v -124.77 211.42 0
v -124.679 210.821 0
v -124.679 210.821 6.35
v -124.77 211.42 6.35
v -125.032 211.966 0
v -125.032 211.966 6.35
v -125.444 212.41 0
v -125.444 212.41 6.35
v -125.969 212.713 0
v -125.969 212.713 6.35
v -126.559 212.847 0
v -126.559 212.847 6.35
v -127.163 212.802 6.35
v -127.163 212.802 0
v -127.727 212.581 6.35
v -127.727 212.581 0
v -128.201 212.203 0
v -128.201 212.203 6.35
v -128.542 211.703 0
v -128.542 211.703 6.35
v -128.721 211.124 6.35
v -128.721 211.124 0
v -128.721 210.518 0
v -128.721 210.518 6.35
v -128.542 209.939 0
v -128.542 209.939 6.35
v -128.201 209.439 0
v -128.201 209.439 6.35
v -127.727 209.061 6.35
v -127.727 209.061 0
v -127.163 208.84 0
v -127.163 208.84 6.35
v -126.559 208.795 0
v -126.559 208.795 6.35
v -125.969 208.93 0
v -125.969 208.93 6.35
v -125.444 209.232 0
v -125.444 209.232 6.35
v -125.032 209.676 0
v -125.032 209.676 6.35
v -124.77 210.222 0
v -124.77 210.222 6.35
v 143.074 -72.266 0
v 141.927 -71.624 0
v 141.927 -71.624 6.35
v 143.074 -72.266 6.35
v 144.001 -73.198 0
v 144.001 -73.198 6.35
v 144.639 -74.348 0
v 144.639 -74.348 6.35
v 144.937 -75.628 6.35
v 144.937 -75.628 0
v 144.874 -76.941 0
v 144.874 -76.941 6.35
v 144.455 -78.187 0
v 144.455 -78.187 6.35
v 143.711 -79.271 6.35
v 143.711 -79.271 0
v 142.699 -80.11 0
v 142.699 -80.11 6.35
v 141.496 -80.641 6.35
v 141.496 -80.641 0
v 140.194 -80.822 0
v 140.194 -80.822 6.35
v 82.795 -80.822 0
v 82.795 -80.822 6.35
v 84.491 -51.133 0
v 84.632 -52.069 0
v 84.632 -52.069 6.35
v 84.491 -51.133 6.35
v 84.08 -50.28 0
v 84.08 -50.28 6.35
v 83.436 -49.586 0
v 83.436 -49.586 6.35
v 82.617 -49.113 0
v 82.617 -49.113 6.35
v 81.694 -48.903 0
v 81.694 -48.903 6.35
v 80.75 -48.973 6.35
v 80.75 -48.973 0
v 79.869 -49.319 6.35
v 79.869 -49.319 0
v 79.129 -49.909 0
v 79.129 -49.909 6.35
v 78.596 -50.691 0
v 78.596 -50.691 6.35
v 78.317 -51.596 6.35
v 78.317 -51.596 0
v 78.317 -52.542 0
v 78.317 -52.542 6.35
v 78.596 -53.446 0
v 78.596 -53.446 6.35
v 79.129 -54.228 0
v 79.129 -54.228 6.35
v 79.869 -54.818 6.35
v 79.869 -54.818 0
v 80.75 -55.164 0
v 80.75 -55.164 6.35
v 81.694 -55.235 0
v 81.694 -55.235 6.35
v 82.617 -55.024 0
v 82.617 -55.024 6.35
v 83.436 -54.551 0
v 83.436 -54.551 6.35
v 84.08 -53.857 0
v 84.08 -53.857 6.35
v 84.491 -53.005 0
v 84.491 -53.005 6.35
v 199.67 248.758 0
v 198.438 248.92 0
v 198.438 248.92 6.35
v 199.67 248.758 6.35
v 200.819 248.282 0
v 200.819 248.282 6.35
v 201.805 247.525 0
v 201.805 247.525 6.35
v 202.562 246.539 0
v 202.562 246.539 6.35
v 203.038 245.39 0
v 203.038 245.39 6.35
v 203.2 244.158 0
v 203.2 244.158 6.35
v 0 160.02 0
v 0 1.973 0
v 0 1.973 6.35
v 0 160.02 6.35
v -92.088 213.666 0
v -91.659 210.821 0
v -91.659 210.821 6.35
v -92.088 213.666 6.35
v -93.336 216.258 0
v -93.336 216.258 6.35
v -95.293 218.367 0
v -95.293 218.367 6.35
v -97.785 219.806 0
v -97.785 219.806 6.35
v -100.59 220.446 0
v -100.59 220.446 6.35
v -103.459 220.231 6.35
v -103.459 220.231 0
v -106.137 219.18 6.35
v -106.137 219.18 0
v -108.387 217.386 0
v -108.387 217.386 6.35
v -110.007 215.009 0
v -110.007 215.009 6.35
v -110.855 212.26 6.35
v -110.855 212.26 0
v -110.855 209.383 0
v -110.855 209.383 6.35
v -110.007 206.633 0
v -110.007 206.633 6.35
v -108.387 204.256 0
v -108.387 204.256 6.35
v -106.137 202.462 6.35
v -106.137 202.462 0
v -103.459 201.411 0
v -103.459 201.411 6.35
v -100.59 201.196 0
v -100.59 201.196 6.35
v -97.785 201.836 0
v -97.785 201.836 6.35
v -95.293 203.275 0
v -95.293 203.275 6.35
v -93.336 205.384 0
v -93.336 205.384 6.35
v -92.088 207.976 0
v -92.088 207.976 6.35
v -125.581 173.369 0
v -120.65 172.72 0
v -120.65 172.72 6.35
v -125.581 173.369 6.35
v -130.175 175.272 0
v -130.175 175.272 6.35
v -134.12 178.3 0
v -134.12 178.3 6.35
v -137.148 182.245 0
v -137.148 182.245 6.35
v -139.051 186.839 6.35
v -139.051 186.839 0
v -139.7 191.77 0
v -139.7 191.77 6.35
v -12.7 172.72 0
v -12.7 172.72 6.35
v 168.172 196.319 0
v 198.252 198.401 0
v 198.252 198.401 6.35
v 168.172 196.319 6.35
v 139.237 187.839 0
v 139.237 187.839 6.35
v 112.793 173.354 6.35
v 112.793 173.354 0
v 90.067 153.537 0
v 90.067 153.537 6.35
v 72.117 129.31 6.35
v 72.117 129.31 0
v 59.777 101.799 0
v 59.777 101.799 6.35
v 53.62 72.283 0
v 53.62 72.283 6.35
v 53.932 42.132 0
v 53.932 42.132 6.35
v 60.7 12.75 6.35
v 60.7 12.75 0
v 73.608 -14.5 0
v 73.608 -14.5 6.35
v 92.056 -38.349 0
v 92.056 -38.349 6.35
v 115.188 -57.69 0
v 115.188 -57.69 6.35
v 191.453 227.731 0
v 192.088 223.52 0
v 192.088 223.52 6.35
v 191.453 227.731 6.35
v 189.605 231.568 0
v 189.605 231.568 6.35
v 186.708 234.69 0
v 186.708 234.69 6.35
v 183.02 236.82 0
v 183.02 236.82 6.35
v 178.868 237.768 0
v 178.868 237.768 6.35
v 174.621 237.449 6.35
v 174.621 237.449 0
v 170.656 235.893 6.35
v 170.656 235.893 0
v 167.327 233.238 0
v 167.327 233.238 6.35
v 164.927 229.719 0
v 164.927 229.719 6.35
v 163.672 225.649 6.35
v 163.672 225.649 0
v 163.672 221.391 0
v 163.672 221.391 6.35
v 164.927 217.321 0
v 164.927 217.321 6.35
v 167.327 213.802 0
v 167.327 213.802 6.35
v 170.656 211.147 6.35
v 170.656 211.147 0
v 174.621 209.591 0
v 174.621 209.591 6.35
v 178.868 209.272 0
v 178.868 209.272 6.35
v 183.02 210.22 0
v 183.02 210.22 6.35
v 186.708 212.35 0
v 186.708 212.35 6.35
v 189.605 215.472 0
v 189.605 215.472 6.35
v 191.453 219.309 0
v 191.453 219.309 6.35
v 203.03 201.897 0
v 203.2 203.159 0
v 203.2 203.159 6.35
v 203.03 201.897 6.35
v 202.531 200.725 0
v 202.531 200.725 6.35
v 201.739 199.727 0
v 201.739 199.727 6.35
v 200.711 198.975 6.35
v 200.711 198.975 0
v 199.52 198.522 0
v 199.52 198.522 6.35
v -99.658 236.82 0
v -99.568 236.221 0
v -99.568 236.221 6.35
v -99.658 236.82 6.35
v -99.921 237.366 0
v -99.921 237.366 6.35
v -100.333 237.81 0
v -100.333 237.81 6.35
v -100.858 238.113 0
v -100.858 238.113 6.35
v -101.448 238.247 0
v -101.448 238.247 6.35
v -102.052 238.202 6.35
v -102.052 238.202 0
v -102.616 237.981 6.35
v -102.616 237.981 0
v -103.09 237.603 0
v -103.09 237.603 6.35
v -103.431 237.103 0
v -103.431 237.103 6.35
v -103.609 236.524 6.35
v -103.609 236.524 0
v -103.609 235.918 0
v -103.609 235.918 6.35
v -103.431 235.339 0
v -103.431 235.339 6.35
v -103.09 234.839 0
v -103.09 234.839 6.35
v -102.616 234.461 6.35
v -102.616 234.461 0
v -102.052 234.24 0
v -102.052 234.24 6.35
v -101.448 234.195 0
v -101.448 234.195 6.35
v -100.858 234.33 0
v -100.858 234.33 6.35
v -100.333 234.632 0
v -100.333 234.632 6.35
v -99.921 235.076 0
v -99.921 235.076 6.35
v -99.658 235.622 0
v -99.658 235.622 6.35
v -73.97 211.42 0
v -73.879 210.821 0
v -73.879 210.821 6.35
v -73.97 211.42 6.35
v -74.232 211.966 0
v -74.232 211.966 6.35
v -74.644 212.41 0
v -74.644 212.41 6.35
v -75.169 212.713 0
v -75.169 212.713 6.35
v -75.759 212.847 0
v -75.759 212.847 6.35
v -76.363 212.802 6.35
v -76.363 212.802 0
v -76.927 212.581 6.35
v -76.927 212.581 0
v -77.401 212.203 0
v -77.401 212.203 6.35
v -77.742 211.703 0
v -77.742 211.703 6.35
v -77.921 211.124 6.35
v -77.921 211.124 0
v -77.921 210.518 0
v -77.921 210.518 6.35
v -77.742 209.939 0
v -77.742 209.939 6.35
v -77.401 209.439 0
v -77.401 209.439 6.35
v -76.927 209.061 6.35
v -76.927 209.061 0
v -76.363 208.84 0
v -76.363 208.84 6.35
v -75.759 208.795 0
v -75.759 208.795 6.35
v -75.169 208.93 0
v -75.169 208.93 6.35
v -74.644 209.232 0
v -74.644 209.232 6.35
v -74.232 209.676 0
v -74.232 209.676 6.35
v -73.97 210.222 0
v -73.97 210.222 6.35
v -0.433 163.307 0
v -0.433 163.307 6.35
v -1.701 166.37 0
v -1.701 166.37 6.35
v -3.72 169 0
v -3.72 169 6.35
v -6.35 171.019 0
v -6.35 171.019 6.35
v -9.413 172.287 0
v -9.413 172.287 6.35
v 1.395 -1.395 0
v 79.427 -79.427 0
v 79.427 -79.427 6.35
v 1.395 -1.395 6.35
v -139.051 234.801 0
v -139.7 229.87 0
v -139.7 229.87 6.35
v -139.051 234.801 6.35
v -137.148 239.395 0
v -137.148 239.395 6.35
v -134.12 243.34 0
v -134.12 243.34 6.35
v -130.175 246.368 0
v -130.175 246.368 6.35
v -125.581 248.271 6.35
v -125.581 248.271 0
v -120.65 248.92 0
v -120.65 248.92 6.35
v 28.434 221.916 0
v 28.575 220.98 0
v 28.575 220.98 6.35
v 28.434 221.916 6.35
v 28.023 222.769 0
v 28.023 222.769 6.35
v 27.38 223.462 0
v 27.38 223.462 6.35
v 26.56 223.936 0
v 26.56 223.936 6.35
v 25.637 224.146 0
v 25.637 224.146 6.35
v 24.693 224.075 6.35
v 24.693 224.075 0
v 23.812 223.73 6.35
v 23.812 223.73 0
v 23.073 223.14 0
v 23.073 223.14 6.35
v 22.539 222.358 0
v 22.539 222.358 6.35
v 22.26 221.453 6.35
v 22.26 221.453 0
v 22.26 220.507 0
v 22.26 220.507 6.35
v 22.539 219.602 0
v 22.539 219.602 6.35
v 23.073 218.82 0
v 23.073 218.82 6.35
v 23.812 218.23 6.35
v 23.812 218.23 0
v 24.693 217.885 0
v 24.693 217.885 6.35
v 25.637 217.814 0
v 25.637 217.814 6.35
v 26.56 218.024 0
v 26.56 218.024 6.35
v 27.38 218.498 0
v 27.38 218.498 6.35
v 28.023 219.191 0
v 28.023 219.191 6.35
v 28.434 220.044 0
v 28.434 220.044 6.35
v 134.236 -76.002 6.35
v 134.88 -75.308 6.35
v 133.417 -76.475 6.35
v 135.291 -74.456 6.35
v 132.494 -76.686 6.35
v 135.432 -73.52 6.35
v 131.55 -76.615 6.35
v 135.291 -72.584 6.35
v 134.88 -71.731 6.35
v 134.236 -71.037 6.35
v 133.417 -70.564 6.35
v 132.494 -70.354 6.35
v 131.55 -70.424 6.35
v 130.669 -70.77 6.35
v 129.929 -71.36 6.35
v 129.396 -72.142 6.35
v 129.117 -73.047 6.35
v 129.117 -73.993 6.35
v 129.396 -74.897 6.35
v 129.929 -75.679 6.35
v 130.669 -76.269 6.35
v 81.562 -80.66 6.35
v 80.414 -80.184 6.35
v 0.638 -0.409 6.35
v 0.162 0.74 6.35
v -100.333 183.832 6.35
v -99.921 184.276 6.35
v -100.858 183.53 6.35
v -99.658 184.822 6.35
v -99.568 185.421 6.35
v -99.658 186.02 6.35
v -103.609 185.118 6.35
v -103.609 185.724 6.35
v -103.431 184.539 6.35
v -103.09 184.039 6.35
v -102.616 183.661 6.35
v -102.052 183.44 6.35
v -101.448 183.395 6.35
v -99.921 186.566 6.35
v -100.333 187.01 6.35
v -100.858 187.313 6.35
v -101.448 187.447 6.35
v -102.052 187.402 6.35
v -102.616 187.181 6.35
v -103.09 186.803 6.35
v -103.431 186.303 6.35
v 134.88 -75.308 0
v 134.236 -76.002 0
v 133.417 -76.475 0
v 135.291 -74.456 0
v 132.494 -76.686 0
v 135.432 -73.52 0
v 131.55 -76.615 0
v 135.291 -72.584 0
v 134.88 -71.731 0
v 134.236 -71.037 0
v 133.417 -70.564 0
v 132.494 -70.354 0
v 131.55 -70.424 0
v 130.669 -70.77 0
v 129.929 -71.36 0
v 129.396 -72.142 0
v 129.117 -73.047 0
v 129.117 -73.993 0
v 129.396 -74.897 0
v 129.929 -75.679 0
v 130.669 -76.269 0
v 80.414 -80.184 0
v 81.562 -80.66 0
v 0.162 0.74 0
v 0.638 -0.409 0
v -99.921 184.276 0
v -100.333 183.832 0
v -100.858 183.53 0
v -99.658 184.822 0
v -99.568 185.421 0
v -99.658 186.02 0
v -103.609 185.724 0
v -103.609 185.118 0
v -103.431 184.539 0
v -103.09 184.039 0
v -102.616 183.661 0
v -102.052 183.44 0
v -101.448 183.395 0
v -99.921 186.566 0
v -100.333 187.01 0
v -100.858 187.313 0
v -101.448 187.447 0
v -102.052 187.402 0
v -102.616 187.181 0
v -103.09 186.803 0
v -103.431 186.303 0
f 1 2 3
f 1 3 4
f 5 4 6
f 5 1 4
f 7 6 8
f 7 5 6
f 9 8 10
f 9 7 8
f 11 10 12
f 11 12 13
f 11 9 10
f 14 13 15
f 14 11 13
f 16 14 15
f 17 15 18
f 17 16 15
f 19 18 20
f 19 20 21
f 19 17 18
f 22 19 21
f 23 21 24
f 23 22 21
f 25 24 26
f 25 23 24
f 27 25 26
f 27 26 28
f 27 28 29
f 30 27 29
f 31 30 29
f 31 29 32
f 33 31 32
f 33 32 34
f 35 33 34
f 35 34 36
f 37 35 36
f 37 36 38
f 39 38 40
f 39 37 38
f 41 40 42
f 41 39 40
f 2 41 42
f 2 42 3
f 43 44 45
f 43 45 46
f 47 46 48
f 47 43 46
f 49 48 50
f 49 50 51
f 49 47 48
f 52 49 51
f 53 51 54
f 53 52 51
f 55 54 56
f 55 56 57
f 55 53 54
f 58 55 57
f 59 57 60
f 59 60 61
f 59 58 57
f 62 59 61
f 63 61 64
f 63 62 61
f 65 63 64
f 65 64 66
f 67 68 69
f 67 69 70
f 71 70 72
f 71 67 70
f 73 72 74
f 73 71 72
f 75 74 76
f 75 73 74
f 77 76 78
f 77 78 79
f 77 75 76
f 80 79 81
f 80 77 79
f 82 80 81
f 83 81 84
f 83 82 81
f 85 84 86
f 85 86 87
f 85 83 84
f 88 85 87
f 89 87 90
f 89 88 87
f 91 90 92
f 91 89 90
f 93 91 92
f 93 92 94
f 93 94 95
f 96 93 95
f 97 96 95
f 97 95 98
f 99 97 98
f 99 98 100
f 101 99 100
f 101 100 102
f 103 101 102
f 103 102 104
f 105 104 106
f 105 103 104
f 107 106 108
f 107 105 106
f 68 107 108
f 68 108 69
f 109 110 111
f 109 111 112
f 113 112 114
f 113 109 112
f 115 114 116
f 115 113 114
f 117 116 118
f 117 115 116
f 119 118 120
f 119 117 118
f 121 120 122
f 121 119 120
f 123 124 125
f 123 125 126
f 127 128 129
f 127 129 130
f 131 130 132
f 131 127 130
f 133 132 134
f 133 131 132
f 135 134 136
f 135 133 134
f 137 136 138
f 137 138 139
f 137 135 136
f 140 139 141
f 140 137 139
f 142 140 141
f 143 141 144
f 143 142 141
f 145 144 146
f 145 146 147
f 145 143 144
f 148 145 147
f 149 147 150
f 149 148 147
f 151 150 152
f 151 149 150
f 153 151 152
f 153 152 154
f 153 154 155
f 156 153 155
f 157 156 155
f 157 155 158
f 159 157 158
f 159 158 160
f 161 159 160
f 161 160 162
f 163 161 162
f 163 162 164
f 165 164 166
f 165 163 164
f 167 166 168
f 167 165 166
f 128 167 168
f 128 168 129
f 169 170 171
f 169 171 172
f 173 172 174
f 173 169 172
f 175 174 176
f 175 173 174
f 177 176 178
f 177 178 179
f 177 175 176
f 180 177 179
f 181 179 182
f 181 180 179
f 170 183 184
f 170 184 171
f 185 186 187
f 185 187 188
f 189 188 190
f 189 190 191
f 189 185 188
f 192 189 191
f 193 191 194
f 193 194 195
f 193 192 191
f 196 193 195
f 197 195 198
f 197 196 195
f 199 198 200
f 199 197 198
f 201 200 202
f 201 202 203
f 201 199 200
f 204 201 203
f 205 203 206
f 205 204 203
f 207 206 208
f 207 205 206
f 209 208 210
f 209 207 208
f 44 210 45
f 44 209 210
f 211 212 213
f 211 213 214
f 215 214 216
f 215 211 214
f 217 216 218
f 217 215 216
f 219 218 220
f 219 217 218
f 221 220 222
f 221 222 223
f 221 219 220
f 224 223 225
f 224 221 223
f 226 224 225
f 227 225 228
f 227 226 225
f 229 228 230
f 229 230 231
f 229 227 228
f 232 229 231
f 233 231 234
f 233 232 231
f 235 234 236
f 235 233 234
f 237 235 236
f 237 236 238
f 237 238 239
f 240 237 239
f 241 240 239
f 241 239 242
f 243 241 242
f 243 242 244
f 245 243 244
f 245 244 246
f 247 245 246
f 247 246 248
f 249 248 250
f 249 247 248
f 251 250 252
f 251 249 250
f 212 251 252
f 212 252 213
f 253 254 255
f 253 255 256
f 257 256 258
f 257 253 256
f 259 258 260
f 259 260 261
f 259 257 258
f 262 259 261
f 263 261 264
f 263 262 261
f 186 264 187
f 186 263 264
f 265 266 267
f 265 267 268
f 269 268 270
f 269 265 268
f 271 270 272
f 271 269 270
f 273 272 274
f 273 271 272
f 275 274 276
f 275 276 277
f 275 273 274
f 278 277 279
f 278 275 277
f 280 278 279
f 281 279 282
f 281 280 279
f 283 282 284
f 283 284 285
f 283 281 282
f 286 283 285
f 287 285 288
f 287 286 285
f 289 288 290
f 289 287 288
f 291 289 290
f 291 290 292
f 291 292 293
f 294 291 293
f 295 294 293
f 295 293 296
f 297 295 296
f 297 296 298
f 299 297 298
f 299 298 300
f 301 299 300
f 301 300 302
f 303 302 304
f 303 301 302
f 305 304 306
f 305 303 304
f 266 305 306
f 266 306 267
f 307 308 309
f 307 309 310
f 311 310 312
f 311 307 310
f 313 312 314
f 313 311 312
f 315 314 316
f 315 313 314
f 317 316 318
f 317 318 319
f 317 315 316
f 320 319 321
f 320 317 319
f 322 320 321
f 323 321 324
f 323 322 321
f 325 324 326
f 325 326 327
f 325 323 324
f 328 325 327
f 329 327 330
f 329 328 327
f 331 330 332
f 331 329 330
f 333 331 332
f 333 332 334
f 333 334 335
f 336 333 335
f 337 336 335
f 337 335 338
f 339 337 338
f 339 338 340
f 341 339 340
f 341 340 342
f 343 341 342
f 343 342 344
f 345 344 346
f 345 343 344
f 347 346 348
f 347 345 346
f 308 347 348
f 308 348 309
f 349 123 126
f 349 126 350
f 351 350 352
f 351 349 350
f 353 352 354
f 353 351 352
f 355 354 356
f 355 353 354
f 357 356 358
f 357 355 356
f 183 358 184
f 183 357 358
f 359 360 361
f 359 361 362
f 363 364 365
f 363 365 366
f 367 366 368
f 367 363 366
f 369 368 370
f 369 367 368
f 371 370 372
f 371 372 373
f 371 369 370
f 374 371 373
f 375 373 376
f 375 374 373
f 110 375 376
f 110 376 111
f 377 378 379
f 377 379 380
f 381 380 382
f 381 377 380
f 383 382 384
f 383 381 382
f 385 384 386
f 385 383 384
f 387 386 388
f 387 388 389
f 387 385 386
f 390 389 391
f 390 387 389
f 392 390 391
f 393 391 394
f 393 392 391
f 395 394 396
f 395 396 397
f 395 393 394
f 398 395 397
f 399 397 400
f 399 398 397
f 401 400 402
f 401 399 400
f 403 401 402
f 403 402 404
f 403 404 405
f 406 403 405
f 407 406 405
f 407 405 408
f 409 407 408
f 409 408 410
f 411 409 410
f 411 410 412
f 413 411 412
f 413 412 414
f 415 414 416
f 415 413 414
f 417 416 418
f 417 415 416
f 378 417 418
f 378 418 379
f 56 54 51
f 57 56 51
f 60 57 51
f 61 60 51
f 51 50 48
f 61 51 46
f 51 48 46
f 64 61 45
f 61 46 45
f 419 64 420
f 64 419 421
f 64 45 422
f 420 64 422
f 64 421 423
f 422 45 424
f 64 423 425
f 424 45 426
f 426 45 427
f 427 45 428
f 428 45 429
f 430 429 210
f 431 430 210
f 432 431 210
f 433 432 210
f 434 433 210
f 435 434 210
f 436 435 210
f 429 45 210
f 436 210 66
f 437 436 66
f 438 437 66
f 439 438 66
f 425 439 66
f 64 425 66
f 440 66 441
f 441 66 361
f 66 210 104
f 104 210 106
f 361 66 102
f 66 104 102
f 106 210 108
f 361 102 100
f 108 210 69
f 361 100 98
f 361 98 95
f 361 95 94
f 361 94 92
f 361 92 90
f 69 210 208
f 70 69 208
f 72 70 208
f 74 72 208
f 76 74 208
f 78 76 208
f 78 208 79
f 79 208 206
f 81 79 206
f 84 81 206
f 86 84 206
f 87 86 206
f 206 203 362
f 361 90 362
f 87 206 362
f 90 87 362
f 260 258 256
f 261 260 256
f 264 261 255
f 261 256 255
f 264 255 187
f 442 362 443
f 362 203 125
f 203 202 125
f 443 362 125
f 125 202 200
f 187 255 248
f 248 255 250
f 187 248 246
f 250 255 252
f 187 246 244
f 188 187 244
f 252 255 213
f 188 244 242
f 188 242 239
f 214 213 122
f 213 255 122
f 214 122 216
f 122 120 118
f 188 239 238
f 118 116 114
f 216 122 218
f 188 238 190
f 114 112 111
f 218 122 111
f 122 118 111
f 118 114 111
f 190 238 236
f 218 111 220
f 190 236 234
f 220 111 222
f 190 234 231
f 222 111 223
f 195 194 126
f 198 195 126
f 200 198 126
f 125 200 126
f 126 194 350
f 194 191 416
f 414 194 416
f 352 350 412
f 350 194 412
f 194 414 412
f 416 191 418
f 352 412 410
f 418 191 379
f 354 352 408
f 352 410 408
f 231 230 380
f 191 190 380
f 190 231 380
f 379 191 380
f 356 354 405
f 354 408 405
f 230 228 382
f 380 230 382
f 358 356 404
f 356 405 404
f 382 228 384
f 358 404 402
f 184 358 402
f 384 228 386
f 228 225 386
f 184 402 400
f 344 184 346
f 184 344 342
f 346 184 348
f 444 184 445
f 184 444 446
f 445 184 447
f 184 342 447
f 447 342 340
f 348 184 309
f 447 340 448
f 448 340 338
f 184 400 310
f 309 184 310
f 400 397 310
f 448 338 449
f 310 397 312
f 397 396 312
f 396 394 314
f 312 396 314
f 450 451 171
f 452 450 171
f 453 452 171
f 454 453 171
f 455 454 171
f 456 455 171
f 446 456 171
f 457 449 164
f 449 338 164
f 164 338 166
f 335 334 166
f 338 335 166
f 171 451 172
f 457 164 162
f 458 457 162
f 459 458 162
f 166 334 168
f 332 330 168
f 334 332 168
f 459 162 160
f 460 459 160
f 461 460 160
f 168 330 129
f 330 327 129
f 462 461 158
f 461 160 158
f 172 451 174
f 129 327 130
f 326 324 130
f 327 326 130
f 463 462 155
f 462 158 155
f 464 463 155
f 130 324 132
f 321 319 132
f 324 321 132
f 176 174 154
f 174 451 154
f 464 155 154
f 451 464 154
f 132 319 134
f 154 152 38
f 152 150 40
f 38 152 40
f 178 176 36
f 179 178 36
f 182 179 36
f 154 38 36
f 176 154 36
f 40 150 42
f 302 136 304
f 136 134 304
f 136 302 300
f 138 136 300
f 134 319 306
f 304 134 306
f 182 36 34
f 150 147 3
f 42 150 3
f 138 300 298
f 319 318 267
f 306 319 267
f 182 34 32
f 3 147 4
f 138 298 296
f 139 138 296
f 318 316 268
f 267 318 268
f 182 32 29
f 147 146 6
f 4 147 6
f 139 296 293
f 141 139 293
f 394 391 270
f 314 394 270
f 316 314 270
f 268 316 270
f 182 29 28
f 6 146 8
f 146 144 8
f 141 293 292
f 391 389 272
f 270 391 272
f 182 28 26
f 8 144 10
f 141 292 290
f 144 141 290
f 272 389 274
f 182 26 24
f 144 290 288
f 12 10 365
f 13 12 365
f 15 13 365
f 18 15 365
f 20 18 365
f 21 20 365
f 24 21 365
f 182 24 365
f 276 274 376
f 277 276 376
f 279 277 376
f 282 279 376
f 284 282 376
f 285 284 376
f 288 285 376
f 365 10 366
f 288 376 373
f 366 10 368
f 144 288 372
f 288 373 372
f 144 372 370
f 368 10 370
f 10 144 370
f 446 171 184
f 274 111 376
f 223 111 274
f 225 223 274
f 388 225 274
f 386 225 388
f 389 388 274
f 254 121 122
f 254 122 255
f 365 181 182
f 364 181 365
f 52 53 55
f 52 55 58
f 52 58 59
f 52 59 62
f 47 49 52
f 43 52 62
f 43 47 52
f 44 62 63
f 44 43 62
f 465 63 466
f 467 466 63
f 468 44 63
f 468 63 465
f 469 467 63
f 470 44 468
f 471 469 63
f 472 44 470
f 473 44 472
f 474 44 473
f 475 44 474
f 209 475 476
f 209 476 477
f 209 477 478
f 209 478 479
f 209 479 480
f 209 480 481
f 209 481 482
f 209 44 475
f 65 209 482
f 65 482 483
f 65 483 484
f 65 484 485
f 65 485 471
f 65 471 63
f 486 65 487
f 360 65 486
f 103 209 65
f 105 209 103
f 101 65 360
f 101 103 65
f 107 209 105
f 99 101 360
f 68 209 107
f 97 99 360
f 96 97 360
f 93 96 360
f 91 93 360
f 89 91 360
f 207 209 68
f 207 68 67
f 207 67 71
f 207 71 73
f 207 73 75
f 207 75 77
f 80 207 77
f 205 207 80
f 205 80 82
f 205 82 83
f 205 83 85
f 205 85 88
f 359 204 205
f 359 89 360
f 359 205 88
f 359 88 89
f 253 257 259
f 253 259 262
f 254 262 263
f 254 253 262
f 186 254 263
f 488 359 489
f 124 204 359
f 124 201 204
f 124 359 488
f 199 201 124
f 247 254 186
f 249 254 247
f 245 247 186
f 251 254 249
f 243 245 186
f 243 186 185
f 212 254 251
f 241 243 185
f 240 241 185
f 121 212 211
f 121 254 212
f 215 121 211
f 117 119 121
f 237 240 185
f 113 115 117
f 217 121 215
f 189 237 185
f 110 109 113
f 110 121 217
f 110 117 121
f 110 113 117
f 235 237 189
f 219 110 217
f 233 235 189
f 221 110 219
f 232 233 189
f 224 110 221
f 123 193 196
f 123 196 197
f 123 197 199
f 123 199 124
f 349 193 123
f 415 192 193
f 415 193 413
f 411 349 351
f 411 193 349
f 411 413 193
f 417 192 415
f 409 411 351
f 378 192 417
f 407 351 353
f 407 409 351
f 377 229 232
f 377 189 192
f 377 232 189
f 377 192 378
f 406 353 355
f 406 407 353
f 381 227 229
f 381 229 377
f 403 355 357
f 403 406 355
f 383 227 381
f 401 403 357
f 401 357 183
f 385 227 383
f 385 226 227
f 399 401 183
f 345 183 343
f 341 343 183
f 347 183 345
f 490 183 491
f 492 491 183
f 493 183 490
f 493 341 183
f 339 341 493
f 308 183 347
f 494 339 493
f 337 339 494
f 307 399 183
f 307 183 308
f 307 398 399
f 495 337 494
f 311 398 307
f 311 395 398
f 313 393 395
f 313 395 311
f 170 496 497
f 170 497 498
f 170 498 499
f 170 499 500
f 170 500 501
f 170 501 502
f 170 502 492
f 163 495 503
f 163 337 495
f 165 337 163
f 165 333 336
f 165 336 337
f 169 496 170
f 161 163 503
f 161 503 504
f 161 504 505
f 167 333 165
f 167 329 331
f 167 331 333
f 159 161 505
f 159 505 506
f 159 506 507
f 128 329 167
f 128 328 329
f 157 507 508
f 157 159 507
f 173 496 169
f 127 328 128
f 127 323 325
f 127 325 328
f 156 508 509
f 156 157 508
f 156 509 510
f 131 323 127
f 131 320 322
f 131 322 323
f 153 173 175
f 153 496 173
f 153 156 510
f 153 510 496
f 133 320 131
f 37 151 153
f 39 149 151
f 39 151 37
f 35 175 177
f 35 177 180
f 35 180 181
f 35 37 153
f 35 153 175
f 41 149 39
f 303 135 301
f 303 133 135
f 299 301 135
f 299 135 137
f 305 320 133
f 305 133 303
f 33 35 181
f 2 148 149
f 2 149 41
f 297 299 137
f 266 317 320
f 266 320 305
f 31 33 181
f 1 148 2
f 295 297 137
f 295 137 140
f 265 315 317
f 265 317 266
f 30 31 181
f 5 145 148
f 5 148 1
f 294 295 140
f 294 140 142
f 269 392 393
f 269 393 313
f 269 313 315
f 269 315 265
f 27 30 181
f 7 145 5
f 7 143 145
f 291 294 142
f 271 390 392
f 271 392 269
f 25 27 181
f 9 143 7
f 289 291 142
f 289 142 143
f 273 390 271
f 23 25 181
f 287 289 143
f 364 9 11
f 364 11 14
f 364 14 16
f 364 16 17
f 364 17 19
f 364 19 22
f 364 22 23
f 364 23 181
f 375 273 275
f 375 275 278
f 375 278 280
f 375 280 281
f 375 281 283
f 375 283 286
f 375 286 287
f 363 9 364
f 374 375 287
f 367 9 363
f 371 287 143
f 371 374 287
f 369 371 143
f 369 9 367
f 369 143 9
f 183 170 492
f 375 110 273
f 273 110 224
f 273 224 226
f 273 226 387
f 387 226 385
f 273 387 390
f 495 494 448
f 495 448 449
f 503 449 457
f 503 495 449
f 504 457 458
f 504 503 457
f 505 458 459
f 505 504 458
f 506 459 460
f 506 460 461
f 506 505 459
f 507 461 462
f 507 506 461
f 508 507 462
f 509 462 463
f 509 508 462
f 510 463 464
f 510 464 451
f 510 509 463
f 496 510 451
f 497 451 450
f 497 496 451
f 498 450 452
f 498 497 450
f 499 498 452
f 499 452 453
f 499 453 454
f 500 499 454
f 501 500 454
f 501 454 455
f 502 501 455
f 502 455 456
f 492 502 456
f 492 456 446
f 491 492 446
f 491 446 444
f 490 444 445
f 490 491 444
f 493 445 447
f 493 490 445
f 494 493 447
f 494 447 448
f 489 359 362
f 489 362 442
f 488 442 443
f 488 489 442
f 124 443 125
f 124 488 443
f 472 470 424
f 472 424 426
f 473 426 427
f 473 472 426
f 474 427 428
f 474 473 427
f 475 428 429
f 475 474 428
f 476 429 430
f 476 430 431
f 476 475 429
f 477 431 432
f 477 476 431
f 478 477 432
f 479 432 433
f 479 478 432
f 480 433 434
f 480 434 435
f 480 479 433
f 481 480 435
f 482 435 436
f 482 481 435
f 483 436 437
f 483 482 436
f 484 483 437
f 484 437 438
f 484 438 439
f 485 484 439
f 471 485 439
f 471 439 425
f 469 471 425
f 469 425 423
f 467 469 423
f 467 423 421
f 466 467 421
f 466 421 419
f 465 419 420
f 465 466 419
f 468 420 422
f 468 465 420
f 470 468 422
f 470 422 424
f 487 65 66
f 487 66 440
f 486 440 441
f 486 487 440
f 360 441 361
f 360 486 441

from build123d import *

# Parameters (mm, degrees)
SKETCH1_R           = 14.2875
SKETCH1_R_2         = 3.175
SKETCH1_R_3         = 9.652
SKETCH1_R_4         = 2.032
BOSS_EXTRUDE3_DEPTH = 6.35


with BuildPart() as part:
    # Sketch1 → Boss-Extrude3 (new body)
    with BuildSketch(Plane.XY):
        with BuildLine():
            Line((0, 1.972692091), (0, 160.02))
            ThreePointArc((0, 160.02), (-3.719743879, 169.000256121), (-12.7, 172.72))
            Line((-12.7, 172.72), (-101.6, 172.72))
            Line((-101.6, 172.72), (-120.65, 172.72))
            ThreePointArc((-120.65, 172.72), (-134.120384182, 178.299615818), (-139.7, 191.77))
            Line((-139.7, 191.77), (-139.7, 229.87))
            ThreePointArc((-139.7, 229.87), (-134.120384182, 243.340384182), (-120.65, 248.92))
            Line((-120.65, 248.92), (-101.6, 248.92))
            Line((-101.6, 248.92), (0, 248.92))
            Line((0, 248.92), (4.7625, 248.92))
            Line((4.7625, 248.92), (198.4375, 248.92))
            ThreePointArc((198.4375, 248.92), (201.805096045, 247.525096045), (203.2, 244.1575))
            Line((203.2, 244.1575), (203.2, 203.159397936))
            ThreePointArc((203.2, 203.159397936), (201.73893916, 199.726919863), (198.252218068, 198.400503437))
            ThreePointArc((198.252218068, 198.400503437), (55.900468813, 87.207475286), (141.92702513, -71.623698082))
            ThreePointArc((141.92702513, -71.623698082), (144.874483412, -76.941407786), (140.194292932, -80.82230509))
            Line((140.194292932, -80.82230509), (82.79499718, -80.82230509))
            ThreePointArc((82.79499718, -80.82230509), (80.972467334, -80.459781363), (79.427401135, -79.427401135))
            Line((79.427401135, -79.427401135), (1.394903955, -1.394903955))
            ThreePointArc((1.394903955, -1.394903955), (0.362523726, 0.150162244), (0, 1.972692091))
        make_face()
        with Locations((177.8, 223.52)):
            Circle(SKETCH1_R, mode=Mode.SUBTRACT)
        with Locations((132.256792932, -73.51980509)):
            Circle(SKETCH1_R_2, mode=Mode.SUBTRACT)
        with Locations((81.456792932, -52.06873783)):
            Circle(SKETCH1_R_2, mode=Mode.SUBTRACT)
        with Locations((25.4, 220.98)):
            Circle(SKETCH1_R_2, mode=Mode.SUBTRACT)
        with Locations((-101.311264174, 210.821094089)):
            Circle(SKETCH1_R_3, mode=Mode.SUBTRACT)
        with Locations((-75.911264174, 210.821094089)):
            Circle(SKETCH1_R_4, mode=Mode.SUBTRACT)
        with Locations((-126.711264174, 210.821094089)):
            Circle(SKETCH1_R_4, mode=Mode.SUBTRACT)
        with Locations((-101.6, 236.221094089)):
            Circle(SKETCH1_R_4, mode=Mode.SUBTRACT)
        with Locations((-101.6, 185.421094089)):
            Circle(SKETCH1_R_4, mode=Mode.SUBTRACT)
    extrude(amount=BOSS_EXTRUDE3_DEPTH)


solid = part.part
